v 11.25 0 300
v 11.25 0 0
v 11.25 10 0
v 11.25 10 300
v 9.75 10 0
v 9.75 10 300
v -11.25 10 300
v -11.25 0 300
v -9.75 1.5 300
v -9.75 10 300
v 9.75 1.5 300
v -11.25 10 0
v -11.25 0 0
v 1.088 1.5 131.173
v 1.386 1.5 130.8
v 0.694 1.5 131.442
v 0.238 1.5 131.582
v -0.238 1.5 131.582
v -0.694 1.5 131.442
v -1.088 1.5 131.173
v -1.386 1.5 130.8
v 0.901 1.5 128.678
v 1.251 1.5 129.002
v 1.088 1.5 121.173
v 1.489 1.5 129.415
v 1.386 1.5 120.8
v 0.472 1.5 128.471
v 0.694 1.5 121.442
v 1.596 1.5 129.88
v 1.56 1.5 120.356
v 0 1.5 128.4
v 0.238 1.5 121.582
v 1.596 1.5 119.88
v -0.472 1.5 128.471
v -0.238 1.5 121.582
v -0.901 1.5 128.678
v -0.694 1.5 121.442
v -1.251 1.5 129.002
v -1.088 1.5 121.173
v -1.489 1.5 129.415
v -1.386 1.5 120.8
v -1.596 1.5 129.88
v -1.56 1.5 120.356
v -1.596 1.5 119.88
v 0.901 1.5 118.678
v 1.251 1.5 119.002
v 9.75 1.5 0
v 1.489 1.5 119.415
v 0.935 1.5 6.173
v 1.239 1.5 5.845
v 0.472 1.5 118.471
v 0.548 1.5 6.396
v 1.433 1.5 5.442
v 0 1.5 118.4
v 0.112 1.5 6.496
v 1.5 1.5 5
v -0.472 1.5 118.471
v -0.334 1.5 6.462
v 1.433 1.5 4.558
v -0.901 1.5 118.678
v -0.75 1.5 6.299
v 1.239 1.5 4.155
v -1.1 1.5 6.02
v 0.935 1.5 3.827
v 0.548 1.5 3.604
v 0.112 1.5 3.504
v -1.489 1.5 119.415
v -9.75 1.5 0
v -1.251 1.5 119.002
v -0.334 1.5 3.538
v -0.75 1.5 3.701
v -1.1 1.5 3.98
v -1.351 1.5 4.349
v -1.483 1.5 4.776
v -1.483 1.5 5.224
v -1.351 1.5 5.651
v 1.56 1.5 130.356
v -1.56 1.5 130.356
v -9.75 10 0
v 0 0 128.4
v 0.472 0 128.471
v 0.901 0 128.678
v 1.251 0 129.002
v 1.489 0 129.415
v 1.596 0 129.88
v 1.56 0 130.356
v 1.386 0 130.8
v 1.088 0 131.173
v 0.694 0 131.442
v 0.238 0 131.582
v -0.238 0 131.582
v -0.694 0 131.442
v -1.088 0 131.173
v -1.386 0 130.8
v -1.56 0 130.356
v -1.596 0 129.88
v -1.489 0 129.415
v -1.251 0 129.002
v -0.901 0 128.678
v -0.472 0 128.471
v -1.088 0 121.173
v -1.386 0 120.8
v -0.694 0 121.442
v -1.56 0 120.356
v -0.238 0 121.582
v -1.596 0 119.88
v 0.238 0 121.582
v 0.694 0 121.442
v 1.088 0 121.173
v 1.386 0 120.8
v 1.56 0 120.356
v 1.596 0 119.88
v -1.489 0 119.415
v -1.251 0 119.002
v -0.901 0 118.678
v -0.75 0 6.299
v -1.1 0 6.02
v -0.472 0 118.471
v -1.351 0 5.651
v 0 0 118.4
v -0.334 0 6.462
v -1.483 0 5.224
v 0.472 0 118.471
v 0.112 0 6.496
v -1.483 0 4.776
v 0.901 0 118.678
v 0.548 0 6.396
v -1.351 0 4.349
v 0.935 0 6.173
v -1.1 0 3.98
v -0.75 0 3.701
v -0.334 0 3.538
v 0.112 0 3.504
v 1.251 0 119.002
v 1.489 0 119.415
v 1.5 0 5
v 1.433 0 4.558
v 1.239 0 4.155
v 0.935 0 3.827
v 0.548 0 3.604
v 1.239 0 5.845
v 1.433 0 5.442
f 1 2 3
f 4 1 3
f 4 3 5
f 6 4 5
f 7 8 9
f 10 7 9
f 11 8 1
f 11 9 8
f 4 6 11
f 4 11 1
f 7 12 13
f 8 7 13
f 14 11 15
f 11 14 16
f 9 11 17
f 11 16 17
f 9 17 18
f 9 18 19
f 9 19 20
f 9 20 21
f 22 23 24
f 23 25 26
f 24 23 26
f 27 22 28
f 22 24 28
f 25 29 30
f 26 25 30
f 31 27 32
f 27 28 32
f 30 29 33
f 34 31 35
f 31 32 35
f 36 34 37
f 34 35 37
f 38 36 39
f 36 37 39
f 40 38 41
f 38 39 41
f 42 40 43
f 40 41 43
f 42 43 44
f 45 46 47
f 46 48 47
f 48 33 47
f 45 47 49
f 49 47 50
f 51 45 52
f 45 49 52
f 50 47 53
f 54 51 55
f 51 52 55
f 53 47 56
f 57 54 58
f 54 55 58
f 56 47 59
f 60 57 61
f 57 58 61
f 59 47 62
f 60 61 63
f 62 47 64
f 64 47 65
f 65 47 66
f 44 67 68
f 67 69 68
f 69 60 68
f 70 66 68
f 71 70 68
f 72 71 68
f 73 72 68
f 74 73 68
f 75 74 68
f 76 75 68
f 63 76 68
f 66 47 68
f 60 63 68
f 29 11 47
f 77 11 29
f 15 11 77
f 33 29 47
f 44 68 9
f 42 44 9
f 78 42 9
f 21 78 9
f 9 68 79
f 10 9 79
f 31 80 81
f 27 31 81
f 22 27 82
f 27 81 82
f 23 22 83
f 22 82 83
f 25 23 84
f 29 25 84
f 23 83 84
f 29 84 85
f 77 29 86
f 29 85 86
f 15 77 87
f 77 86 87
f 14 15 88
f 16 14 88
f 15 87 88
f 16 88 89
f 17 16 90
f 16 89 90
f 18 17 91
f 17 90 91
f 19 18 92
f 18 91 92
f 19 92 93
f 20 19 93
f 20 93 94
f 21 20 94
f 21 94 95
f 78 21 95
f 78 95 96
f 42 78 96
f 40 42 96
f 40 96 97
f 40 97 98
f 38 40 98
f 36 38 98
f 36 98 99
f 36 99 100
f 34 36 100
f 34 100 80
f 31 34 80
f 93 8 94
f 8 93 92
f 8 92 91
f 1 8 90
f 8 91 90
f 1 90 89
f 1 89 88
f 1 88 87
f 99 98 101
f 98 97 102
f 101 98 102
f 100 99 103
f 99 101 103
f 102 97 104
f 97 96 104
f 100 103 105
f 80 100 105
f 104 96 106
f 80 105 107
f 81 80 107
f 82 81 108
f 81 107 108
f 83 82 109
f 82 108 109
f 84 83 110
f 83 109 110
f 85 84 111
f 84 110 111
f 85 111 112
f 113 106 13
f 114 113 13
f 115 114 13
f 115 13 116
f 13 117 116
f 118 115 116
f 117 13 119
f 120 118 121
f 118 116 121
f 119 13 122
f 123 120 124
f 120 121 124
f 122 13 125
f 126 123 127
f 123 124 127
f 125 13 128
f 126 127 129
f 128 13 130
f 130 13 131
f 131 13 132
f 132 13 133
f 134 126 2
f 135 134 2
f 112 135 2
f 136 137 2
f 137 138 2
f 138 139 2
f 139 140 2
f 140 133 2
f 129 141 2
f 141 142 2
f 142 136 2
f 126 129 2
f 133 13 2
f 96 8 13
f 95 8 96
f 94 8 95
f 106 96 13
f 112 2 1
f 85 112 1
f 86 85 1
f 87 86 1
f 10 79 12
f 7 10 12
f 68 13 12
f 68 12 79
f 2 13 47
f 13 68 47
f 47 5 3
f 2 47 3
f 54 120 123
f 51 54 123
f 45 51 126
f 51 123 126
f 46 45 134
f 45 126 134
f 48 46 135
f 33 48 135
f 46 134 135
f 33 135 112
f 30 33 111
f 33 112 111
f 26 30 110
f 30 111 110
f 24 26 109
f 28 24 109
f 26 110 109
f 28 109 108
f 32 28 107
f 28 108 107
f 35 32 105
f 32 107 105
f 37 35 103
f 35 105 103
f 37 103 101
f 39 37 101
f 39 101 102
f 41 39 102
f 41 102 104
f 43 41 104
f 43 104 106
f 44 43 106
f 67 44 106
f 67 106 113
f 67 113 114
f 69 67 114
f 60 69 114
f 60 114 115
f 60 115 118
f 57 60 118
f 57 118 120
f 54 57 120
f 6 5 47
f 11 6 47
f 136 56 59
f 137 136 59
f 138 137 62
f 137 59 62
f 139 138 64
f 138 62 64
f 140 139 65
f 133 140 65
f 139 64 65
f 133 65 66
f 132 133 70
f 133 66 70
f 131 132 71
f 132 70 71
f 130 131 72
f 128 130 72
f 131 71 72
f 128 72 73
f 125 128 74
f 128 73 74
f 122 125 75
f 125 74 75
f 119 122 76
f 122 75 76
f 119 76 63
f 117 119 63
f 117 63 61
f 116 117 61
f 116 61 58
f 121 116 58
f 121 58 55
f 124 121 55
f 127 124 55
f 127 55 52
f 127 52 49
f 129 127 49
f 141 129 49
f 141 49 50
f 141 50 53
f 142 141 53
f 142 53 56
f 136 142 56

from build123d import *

# Parameters (mm, degrees)
BOSS_EXTRU_1_DEPTH                  = 300
ESQUISSE2_R                         = 1.6
ENL_V_MAT_EXTRU_1_DEPTH             = 301.377366824
F_3_0_3_DURCHMESSER_LANGLOCH1_D     = 3
F_3_0_3_DURCHMESSER_LANGLOCH1_DEPTH = 12.5
F_3_0_3_DURCHMESSER_LANGLOCH1_TIP   = 0.901290929


with BuildPart() as part:
    # Esquisse1 → Boss.-Extru.1 (new body)
    with BuildSketch(Plane.XY):
        Polygon((-11.25, 0), (11.25, 0), (11.25, 10), (9.75, 10), (9.75, 1.5), (-9.75, 1.5), (-9.75, 10), (-11.25, 10), align=None)
    extrude(amount=BOSS_EXTRU_1_DEPTH)

    # Esquisse2 → Enlèv. mat.-Extru.1 (cut, through all)
    with BuildSketch(Plane.XZ):
        with Locations(Location((0, 120, 0), (0, 0, 270))):
            Circle(ESQUISSE2_R)
        with Locations(Location((0, 130, 0), (0, 0, 270))):
            Circle(ESQUISSE2_R)
    extrude(amount=-ENL_V_MAT_EXTRU_1_DEPTH, mode=Mode.SUBTRACT)

    # Ø3.0 (3) Durchmesser Langloch1
    with Locations(Plane(origin=(0, 0, 0), x_dir=(-1, 0, 0), z_dir=(0, -1, 0))):
        with Locations((0, -5)):
            Hole(F_3_0_3_DURCHMESSER_LANGLOCH1_D / 2, depth=F_3_0_3_DURCHMESSER_LANGLOCH1_DEPTH)
            with Locations((0, 0, -(F_3_0_3_DURCHMESSER_LANGLOCH1_DEPTH + F_3_0_3_DURCHMESSER_LANGLOCH1_TIP / 2))):  # 118° drill point
                Cone(0, F_3_0_3_DURCHMESSER_LANGLOCH1_D / 2, F_3_0_3_DURCHMESSER_LANGLOCH1_TIP, mode=Mode.SUBTRACT)


solid = part.part
